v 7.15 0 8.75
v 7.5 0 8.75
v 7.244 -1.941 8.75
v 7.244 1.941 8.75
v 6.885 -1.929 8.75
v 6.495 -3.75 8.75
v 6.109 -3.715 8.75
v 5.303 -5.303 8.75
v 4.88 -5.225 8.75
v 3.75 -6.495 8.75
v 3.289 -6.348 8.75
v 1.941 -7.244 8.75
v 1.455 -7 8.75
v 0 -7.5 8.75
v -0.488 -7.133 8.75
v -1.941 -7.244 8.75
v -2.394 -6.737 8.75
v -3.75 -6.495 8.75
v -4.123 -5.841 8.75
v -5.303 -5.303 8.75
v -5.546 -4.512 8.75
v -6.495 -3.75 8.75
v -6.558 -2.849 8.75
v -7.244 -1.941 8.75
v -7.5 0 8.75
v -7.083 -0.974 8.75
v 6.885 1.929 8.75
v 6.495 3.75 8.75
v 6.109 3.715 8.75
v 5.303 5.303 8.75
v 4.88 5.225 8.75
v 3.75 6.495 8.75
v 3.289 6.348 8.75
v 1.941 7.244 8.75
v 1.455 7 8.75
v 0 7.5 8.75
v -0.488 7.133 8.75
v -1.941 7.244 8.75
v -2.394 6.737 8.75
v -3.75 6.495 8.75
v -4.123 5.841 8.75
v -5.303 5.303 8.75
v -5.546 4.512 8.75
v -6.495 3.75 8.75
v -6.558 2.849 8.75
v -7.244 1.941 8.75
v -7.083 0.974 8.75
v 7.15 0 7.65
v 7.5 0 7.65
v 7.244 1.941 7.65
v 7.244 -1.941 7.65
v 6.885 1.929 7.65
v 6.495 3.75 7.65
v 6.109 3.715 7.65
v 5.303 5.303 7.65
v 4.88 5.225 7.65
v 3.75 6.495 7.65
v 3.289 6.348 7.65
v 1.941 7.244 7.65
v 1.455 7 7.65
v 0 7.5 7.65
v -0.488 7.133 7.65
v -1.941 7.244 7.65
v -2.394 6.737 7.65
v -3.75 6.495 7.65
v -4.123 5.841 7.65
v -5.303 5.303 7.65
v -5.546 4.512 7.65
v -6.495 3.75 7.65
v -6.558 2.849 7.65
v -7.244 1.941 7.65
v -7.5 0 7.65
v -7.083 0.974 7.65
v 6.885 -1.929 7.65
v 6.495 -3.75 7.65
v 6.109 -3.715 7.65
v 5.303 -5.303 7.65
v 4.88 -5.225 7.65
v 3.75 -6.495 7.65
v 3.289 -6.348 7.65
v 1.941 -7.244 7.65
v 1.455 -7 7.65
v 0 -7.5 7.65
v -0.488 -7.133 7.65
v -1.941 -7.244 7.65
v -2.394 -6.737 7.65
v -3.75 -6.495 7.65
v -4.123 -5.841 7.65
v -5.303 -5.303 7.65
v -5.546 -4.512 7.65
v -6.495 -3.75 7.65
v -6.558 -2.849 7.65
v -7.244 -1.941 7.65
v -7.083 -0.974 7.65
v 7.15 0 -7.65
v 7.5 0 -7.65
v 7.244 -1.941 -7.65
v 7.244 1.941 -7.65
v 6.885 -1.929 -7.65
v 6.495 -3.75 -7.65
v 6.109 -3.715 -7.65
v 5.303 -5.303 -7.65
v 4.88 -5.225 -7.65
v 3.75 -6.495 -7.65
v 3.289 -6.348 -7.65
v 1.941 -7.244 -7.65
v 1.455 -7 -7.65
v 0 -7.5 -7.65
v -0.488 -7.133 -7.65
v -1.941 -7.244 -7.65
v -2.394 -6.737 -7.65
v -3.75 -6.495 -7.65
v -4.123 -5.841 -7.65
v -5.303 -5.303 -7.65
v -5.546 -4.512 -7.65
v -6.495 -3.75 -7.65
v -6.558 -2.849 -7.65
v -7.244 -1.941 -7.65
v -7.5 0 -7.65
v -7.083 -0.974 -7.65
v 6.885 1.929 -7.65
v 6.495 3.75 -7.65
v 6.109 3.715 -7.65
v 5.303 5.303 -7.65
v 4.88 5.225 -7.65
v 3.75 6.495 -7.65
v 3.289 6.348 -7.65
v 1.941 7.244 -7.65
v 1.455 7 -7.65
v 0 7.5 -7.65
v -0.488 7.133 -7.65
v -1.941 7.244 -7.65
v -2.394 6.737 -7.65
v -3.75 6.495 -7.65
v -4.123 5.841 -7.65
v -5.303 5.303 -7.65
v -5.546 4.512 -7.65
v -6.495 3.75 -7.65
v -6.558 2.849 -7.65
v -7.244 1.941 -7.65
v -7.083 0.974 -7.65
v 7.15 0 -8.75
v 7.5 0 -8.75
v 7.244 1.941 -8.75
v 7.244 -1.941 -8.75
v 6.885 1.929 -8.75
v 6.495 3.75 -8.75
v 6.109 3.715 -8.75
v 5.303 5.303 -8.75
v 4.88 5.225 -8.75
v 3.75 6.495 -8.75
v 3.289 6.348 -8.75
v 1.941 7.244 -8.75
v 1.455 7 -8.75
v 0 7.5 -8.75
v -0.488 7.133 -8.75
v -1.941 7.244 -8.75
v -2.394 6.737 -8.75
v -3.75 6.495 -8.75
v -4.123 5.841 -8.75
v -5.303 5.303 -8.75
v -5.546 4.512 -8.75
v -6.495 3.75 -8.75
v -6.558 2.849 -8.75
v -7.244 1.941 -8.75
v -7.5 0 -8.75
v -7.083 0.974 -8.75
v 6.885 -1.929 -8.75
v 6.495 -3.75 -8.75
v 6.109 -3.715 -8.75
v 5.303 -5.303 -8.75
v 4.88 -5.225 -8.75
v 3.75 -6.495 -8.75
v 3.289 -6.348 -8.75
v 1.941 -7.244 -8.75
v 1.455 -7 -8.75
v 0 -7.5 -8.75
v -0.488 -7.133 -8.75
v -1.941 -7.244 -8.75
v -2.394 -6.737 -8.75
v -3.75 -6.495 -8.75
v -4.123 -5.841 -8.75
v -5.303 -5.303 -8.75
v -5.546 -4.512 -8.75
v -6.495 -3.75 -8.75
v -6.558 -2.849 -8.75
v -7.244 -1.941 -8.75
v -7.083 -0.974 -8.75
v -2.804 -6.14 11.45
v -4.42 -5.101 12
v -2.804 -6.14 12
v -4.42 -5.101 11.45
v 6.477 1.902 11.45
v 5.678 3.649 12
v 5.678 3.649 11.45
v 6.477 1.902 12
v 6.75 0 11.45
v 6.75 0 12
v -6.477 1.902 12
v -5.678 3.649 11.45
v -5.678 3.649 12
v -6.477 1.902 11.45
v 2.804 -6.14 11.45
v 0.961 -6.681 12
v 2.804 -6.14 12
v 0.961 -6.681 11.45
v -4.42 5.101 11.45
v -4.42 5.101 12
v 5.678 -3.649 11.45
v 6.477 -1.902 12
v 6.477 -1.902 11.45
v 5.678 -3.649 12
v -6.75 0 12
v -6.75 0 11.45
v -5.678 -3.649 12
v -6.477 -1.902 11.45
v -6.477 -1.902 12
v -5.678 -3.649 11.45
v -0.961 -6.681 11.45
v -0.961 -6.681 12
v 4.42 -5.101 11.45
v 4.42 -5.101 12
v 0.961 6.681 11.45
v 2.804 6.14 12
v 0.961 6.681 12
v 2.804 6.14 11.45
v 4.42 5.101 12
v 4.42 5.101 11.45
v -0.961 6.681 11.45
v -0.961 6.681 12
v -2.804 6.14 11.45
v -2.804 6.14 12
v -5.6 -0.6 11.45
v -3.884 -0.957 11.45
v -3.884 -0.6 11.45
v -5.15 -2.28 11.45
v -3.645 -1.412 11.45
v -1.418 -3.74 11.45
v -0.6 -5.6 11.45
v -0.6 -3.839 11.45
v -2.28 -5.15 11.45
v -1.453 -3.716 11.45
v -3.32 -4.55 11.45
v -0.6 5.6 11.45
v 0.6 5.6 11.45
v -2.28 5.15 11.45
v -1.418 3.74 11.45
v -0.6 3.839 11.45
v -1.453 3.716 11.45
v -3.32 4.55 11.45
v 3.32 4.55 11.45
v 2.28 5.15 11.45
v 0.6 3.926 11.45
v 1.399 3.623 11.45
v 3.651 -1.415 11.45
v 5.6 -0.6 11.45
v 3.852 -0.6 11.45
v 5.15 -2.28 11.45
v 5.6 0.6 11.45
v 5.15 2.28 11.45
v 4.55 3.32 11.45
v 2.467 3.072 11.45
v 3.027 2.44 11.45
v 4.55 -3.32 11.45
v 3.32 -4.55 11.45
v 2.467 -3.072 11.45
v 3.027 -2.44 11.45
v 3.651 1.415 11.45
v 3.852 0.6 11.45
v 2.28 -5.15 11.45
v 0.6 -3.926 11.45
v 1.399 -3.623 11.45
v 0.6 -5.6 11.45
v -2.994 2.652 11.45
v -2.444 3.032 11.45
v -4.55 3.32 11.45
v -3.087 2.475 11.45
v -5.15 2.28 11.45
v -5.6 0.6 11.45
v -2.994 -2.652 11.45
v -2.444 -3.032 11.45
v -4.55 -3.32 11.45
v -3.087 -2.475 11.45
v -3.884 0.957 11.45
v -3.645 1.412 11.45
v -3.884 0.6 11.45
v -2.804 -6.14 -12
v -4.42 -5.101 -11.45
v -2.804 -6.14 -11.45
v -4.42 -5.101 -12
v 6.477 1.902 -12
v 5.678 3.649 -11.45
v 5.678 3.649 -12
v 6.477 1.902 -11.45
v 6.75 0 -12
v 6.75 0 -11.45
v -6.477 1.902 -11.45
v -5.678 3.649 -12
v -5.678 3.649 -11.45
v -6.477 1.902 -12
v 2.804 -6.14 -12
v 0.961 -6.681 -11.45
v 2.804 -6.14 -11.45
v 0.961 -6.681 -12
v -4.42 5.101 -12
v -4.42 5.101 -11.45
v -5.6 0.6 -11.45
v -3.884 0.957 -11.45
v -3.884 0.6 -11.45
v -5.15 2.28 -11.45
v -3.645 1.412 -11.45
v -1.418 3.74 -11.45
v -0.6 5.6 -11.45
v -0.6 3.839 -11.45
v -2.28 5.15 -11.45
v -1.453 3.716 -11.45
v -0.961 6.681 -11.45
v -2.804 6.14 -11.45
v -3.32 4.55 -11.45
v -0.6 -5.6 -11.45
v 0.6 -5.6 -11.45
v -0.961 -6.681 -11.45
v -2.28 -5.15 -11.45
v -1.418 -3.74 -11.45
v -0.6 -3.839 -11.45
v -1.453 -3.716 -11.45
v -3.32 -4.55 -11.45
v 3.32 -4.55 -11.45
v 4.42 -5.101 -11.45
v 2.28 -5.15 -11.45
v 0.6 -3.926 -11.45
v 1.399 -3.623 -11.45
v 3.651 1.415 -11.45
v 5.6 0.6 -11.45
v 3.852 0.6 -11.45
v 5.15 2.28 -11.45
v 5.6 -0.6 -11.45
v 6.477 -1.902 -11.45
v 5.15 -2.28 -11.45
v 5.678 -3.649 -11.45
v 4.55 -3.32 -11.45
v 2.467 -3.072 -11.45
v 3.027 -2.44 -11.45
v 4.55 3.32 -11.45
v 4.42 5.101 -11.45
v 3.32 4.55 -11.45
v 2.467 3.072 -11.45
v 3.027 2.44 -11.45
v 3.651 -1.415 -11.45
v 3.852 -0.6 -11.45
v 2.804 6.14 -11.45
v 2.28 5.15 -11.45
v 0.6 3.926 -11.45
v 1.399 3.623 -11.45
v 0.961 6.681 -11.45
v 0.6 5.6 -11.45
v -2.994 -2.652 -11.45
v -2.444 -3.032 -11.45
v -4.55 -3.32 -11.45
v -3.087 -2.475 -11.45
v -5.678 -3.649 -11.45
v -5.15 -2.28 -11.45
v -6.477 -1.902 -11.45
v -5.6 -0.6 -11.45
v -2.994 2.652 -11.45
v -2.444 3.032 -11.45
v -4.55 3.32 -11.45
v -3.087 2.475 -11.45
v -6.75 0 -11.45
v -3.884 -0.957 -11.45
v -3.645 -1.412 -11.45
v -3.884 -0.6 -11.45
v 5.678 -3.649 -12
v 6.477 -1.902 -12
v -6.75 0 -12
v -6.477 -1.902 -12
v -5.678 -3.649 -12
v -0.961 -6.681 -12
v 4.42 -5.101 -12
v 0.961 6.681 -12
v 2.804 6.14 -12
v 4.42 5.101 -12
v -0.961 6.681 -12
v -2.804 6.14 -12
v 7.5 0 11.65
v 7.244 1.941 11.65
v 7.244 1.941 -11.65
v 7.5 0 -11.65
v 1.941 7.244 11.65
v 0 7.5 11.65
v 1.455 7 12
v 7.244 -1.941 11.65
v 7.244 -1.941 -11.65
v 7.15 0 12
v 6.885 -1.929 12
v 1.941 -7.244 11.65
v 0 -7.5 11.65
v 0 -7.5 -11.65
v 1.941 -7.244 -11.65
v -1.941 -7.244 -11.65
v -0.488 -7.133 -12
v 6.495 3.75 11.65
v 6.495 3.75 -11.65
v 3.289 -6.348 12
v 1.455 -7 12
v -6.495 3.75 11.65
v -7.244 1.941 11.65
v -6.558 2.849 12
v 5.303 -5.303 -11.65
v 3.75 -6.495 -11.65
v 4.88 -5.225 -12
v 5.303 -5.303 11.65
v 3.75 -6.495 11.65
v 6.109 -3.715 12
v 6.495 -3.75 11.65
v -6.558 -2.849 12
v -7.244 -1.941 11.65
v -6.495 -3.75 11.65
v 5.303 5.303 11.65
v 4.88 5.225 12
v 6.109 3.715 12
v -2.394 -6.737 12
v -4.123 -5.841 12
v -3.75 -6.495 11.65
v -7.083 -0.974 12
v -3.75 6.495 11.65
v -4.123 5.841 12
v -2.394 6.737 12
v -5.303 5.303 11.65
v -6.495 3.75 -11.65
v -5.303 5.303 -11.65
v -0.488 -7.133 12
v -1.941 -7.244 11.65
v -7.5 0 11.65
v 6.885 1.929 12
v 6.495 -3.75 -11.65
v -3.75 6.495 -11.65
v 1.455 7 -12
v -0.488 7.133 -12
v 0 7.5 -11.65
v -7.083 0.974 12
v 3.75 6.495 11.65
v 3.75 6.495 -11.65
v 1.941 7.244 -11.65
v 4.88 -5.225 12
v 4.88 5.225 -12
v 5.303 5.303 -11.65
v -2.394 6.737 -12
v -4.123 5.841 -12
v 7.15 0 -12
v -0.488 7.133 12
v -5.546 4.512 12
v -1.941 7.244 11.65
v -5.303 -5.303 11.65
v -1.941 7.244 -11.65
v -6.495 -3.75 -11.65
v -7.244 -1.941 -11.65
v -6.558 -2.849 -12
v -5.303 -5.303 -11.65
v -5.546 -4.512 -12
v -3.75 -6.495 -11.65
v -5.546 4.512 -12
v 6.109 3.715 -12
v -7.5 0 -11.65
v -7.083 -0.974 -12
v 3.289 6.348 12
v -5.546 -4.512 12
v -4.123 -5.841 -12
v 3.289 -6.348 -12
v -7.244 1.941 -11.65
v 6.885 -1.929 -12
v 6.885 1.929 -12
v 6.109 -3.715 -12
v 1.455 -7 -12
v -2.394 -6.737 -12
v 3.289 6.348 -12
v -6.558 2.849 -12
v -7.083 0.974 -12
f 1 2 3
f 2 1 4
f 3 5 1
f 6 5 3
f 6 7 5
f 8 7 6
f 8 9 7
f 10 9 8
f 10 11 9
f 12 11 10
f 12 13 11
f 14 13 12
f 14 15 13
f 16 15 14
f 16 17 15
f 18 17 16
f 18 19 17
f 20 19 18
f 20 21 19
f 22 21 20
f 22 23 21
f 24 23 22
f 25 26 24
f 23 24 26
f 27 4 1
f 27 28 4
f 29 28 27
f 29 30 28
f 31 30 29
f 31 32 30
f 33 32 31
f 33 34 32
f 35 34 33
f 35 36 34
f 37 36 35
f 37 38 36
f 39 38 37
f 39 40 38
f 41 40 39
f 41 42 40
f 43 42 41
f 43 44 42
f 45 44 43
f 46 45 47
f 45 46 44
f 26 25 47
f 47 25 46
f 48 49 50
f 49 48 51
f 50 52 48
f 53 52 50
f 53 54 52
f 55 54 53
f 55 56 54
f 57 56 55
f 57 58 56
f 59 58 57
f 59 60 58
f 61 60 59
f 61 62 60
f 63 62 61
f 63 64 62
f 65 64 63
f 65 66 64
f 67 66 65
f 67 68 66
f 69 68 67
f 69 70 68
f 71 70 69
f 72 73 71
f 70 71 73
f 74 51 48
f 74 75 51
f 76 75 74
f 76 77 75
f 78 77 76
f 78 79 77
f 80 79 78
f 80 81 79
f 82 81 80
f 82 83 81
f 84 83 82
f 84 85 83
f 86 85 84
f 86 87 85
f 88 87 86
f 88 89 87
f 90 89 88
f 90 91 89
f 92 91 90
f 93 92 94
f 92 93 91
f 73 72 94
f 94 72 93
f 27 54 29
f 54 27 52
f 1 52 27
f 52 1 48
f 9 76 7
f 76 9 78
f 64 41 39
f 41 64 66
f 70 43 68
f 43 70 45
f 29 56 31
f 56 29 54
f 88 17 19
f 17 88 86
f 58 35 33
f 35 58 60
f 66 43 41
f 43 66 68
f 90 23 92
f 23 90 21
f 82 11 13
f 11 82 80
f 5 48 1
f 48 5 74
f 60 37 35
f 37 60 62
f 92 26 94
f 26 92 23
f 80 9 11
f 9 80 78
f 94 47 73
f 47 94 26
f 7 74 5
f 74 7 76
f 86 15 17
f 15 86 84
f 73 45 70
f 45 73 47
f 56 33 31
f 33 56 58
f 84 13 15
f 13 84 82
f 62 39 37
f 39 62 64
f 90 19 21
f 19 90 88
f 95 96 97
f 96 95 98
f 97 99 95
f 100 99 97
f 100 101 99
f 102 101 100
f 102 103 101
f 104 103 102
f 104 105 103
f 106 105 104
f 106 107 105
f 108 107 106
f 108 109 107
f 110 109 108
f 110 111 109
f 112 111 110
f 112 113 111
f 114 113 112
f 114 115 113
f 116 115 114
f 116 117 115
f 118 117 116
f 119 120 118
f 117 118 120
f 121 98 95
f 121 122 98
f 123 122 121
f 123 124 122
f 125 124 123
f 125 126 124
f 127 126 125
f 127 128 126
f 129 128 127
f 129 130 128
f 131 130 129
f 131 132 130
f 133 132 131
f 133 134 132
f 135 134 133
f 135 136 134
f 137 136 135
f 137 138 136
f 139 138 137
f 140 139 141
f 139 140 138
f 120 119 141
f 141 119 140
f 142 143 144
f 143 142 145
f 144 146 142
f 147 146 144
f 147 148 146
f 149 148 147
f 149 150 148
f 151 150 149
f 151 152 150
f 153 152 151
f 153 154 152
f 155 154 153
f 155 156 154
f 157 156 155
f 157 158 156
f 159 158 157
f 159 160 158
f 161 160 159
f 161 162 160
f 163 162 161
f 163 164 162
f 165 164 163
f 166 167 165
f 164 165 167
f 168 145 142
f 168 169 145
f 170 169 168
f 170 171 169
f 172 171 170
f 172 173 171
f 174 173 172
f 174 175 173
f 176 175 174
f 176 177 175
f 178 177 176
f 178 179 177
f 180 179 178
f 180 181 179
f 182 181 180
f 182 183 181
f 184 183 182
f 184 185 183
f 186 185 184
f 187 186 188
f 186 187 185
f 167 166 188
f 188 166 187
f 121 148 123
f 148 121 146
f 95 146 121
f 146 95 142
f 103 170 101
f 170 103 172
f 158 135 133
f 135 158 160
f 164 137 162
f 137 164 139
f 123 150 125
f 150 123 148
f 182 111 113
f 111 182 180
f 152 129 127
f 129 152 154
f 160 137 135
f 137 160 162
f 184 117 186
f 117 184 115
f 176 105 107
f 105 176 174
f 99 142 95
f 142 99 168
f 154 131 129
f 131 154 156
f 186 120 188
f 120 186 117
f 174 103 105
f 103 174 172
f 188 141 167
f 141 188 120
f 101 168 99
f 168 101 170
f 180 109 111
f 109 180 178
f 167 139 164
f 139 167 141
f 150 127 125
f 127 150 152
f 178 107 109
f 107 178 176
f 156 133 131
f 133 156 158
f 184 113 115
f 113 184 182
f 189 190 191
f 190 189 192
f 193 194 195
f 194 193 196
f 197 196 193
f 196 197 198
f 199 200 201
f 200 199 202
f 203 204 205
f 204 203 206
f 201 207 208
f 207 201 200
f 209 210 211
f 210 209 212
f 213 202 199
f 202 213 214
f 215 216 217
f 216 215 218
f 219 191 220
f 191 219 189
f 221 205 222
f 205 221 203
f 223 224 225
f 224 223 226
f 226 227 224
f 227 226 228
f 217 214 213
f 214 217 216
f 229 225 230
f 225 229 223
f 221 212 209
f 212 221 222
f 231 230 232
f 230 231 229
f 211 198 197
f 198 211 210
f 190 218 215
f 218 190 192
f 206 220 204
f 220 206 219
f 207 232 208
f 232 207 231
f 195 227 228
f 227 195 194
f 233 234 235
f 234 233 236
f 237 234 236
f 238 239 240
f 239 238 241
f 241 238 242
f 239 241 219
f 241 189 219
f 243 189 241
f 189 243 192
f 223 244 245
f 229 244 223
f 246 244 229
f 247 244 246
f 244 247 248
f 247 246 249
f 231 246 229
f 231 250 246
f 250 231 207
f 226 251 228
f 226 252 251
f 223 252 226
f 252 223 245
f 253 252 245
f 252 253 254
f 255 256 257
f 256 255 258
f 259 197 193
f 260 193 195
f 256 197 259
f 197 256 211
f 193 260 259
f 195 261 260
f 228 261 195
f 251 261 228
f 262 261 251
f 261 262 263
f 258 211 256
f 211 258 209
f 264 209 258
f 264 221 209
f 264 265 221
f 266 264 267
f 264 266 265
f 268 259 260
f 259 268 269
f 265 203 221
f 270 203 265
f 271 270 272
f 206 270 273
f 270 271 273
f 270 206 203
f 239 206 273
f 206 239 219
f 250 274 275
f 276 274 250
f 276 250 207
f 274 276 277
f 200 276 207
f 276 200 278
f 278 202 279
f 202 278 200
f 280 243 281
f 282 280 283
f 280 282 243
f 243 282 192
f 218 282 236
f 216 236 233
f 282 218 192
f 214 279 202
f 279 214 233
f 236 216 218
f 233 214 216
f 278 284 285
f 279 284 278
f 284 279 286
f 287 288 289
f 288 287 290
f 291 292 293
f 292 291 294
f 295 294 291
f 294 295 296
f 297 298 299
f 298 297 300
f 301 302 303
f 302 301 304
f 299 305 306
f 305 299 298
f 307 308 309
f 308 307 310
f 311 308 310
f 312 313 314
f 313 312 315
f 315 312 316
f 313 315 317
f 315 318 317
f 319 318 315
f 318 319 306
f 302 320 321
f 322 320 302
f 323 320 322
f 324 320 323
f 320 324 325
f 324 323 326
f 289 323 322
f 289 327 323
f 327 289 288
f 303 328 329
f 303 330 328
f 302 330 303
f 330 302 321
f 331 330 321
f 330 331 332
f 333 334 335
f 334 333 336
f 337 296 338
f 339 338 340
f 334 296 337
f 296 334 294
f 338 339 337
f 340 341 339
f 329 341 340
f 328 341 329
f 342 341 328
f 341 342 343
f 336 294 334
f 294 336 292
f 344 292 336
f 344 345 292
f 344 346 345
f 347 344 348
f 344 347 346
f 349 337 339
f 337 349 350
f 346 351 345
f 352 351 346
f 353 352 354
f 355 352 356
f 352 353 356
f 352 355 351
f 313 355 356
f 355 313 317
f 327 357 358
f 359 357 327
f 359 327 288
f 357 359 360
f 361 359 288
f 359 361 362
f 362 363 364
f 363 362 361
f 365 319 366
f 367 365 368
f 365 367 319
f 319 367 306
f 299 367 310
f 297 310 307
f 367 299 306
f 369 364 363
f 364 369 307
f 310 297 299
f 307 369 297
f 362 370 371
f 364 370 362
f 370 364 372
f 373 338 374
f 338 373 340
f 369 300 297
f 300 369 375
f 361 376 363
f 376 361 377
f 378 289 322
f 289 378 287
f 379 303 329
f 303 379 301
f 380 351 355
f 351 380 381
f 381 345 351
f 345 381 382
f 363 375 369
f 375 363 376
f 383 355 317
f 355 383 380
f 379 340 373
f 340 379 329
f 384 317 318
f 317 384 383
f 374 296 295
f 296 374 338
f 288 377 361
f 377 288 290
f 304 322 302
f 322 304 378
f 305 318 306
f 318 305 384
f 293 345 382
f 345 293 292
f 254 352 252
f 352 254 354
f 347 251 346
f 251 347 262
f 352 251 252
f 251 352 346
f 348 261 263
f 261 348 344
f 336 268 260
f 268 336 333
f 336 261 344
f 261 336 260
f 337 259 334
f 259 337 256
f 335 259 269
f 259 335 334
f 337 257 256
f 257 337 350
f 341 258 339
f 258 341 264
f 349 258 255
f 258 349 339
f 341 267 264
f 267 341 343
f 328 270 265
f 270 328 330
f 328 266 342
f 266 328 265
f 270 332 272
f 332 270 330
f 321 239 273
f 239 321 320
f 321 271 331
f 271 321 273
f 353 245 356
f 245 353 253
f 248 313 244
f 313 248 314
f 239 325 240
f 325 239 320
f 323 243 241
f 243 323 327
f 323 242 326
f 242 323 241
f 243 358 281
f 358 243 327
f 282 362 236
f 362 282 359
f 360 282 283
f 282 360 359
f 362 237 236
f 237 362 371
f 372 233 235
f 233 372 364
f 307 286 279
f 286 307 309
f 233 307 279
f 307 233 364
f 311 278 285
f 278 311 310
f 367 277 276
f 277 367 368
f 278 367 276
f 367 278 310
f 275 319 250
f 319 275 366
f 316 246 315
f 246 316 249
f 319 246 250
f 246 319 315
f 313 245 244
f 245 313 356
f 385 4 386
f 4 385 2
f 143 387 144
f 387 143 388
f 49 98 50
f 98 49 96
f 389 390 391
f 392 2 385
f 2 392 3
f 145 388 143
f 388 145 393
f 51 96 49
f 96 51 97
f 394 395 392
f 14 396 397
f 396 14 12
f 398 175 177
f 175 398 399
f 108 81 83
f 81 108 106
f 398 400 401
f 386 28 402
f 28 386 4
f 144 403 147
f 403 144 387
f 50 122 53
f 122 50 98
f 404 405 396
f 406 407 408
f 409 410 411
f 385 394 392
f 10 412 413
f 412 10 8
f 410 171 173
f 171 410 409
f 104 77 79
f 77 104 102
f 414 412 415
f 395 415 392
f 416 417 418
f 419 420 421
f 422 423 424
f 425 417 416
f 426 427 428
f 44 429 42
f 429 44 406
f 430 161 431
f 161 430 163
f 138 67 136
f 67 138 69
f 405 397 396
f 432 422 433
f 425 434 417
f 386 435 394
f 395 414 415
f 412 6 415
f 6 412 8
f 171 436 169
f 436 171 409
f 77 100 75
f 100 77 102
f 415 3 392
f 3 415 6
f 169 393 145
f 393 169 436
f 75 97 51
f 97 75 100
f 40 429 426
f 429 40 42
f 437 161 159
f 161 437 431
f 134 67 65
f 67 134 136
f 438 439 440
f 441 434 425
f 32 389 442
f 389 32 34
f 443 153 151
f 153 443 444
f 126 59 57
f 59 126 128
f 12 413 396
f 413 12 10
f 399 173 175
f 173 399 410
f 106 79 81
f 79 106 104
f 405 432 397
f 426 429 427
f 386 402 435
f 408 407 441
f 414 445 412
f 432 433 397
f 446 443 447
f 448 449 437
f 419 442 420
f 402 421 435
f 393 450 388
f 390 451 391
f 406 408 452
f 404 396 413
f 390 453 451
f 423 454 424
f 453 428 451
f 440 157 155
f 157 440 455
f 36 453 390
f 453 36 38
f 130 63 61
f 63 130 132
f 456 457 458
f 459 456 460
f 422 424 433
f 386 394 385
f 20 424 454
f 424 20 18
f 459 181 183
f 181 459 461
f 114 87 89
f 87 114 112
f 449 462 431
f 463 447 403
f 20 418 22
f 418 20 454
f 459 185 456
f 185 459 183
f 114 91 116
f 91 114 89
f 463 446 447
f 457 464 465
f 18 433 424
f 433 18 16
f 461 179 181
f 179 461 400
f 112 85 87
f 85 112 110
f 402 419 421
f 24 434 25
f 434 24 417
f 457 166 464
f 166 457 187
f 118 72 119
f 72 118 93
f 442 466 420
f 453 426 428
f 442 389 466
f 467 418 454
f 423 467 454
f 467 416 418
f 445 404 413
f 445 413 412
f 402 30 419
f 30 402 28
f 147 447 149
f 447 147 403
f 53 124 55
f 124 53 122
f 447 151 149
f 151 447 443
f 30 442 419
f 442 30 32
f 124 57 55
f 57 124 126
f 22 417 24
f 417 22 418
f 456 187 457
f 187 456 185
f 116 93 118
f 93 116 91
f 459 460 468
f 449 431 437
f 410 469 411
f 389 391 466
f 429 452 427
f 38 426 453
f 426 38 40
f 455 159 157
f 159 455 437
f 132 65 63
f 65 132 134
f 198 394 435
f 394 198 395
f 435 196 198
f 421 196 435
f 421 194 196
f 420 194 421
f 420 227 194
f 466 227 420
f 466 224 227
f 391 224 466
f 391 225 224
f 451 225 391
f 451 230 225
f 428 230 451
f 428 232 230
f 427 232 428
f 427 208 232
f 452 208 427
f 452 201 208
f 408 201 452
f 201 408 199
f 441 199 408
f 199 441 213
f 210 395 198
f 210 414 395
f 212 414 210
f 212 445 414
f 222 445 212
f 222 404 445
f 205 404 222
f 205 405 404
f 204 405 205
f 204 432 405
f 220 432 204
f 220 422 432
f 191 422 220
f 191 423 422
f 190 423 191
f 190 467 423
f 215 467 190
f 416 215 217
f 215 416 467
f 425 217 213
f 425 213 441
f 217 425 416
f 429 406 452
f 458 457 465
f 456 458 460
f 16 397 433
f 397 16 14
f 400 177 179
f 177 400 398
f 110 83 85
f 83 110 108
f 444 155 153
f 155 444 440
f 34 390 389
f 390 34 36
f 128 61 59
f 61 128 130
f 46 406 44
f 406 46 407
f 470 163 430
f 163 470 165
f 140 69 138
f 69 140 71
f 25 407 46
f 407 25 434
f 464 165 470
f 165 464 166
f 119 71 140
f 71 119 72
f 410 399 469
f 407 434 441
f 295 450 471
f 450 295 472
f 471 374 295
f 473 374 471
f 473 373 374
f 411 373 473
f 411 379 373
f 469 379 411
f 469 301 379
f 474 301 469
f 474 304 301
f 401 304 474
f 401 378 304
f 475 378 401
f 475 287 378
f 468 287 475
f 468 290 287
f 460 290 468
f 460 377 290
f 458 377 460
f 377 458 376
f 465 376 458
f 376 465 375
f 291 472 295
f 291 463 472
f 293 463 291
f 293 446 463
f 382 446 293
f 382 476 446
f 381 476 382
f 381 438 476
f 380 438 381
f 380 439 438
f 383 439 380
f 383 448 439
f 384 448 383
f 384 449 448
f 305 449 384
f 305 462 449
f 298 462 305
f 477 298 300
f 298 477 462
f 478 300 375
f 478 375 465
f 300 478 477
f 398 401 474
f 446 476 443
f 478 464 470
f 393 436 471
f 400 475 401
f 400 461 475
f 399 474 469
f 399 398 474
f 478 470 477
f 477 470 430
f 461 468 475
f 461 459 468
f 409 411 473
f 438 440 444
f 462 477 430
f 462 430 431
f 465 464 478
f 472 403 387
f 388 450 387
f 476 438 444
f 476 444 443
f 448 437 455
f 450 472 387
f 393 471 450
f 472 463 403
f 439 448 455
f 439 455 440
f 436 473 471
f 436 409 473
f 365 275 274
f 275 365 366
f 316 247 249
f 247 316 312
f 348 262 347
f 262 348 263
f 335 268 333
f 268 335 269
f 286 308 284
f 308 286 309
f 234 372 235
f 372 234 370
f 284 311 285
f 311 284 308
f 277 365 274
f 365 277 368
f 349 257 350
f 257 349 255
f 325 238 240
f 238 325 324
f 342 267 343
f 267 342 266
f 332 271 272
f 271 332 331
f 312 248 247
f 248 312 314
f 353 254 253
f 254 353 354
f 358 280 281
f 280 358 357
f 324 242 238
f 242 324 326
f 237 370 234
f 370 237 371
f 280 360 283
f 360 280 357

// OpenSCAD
// Open SCAD model of linear Bearing LM-8-UU & KB-12-WW

//     LM-8-UU        KB-12-WW
//	D_Int =  8.0	D_Int = 12.0
//	D_Ext = 15.0	D_Ext = 22.0
//	D_1   = 14.3	D_1   = 21.0
//	L     = 24.0	L     = 32.0
//	W     =  1.1	W     =  1.3
//	B     = 17.5	B     = 22.9

model = "LM-8-UU"; // Bearing model
depth = 1.6;       // Groove depth
width = 1.2;       // Groove width
count = 12;        // Groove count
dint =  8.0;      // Internal diameter
dext = 15.0;      // External diameter
d1   = 14.3;      // D1
l     = 24.0;      // L
w     =  1.1;      // W
b     = 17.5;      // B


module groove(d1, d2, w) {
	difference() {
		cylinder(r=d1/2+1, h=w, center=true);
		cylinder(r=d2/2  , h=w, center=true);
	}
}

module lb(D_Int=8, D_Ext=15, D_1=14.3, L=24, W=1.1, B=17.5) {
chamf = D_Ext - D_1;
	difference() {
		hull() {
			cylinder(r=D_Ext/2, h=L-chamf, center=true);
			cylinder(r=D_1  /2, h=L      , center=true);
		}
		cylinder(r=D_Int/2, h=L+2    , center=true);
        %cylinder(r = D_Int/ 2, h=L+20, $fn=256, center=true);
		translate([0, 0, B/2-W/2]) groove(D_Ext, D_1, W);
		translate([0, 0,-B/2+W/2]) groove(D_Ext, D_1, W);
		translate([0, 0,     L/2]) groove(D_Ext-(D_Ext-D_Int)/2, 1, W);
		translate([0, 0,    -L/2]) groove(D_Ext-(D_Ext-D_Int)/2, 1, W);
        
        for (i = [0:count]) assign( grooveAngle=(i+1)*360/count) {
            rotate(90-grooveAngle) translate([0,-(width/2),-(L/2)])
            cube(size=[(D_Int/2)+depth, width, L], center=false);
        }

    
	}
    
}


module linear_bearing(linear_bearing_type) {
	if(linear_bearing_type == "LM-8-UU") {   //LM-8-UU
		lb(D_Int=8, D_Ext=15, D_1=14.3, L=24, W=1.1, B=17.5);
	}
	else {
		if(linear_bearing_type == "KB-12-WW") {   //KB-12-WW
			lb(D_Int=12, D_Ext=22, D_1=21, L=32, W=1.3, B=22.9);
		}
        else {
            lb(D_Int=dint, D_Ext=dext, D_1=d1, L=l, W=w, B=b);
        }
	}
}

linear_bearing(model);
//    lb(D_Int=6, D_Ext=15, D_1=14.3, L=30, W=1.1, B=17.5);
